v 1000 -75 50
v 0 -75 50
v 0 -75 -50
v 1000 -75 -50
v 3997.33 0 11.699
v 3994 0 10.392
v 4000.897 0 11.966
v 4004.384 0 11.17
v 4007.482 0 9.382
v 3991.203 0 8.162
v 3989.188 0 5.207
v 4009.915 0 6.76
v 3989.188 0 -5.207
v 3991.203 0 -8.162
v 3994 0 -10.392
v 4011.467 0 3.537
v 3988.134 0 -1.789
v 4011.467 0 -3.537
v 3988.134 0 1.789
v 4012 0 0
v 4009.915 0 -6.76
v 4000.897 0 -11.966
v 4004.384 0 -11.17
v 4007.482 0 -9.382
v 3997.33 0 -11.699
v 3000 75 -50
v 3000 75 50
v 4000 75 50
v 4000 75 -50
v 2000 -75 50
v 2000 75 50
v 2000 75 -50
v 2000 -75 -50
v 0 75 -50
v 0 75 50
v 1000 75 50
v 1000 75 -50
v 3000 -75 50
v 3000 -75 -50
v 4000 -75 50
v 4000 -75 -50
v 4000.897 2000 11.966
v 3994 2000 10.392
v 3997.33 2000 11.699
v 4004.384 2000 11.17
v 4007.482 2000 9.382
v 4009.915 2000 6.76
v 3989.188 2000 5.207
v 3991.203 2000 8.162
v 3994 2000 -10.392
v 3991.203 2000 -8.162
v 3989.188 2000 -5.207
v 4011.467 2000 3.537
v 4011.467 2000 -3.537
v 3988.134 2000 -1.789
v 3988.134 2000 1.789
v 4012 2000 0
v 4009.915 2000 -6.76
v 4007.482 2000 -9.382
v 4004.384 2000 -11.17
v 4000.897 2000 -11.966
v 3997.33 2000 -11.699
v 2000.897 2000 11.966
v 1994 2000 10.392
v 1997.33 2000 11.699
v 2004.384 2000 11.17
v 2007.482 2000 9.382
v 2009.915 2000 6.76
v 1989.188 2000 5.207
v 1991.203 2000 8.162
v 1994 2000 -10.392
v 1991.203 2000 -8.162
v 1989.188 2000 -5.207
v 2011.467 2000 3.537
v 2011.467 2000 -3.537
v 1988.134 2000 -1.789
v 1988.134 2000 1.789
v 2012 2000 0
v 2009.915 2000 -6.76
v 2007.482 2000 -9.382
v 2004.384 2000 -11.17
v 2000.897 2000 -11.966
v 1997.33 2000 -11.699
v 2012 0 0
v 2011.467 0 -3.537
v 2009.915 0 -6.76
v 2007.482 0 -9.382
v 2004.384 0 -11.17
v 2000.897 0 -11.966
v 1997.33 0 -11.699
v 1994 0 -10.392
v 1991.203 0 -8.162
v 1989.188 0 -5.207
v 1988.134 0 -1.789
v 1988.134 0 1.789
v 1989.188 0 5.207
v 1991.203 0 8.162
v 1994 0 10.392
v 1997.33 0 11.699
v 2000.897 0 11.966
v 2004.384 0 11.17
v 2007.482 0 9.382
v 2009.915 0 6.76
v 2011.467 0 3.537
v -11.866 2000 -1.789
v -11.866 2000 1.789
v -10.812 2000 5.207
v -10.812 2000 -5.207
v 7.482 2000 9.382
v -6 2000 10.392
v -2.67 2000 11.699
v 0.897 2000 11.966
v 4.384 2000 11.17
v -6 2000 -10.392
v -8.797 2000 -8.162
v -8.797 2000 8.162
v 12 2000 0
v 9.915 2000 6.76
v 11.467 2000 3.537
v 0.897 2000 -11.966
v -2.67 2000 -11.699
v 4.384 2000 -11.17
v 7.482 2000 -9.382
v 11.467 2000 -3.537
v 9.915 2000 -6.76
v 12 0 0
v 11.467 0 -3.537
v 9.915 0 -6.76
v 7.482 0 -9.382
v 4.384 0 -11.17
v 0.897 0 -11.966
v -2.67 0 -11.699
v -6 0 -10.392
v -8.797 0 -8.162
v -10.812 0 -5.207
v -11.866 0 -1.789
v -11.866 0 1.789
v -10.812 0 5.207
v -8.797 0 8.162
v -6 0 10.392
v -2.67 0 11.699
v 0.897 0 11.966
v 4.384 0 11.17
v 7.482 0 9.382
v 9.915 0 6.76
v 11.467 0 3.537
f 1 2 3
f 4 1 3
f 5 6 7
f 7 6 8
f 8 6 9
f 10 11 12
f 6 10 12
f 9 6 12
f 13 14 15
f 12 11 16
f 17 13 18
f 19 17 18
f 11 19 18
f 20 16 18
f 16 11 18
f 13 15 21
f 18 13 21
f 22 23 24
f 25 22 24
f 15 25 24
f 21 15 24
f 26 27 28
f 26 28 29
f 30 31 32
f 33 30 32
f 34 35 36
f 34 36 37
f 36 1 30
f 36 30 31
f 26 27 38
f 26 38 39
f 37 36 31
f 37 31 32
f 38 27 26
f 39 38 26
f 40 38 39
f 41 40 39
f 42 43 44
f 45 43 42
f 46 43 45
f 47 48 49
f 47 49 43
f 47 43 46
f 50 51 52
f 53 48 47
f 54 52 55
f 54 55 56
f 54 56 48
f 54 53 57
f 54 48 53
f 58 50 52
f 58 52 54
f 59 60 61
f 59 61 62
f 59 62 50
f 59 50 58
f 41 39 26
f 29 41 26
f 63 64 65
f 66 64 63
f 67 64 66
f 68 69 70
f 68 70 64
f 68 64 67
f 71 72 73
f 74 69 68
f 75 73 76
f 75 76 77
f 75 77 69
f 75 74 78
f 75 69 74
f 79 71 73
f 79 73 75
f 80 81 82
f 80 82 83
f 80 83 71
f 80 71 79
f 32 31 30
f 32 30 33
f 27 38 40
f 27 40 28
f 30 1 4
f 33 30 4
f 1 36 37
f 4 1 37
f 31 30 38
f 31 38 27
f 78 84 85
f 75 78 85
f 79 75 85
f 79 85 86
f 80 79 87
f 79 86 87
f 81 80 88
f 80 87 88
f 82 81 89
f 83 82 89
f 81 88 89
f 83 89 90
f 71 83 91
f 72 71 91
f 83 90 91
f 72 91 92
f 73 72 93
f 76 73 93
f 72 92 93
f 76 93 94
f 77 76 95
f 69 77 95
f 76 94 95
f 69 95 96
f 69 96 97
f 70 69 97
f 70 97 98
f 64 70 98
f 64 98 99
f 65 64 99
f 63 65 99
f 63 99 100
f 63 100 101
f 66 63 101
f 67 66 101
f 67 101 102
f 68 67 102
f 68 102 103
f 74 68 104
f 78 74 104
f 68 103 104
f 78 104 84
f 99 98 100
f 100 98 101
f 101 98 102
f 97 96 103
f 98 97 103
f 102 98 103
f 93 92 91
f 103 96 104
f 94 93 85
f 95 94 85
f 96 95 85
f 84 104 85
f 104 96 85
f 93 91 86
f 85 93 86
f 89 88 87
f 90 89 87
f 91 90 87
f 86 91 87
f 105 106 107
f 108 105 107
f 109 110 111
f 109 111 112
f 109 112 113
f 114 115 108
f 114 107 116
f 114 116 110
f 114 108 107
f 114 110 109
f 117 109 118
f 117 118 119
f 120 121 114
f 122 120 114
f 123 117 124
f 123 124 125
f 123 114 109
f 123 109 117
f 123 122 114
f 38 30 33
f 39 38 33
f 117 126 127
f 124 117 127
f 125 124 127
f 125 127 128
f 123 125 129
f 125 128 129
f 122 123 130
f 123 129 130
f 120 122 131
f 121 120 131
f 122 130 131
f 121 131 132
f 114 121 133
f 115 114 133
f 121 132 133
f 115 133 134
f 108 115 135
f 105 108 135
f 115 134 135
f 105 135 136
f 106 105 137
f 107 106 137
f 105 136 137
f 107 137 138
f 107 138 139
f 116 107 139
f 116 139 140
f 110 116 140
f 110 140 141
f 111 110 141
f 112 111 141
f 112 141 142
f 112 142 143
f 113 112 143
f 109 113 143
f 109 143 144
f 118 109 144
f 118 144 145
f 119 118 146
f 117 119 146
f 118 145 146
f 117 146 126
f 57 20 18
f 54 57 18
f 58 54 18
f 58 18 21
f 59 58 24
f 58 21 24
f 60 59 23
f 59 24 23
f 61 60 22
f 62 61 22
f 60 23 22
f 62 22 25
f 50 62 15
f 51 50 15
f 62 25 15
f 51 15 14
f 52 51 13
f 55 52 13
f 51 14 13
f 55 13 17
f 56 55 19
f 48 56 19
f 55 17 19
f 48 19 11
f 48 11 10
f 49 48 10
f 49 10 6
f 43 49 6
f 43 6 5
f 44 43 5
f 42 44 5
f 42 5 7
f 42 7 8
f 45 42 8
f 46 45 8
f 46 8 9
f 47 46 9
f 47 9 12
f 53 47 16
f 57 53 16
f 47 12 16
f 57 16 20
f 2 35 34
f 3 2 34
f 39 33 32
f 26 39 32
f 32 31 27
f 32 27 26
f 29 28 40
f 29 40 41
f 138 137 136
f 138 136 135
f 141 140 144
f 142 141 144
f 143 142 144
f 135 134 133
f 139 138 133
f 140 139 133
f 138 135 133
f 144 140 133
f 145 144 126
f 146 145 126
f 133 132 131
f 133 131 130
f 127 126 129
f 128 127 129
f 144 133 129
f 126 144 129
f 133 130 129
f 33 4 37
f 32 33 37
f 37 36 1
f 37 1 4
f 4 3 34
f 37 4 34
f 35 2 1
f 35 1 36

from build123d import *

# Parameters (mm, degrees)
SKETCH1_W        = 100
SKETCH1_H        = 150
SEGMENT_1_DEPTH  = 1000
SKETCH2_W        = 100
SKETCH2_H        = 150
SEGMENT_2_DEPTH  = 1000
SKETCH3_W        = 100
SKETCH3_H        = 150
SEGMENT_3_DEPTH  = 1000
SKETCH4_W        = 100
SKETCH4_H        = 150
SEGMENT_4_DEPTH  = 1000
SKETCH5_R        = 12
LINKAGES_DEPTH   = 2000
LINKAGES_2_DEPTH = 2000
LINKAGES_3_DEPTH = 2000


with BuildPart() as part:
    # Sketch1 → Segment 1 (new body)
    with BuildSketch(Plane(origin=(0, 0, 0), x_dir=(0, 0, -1), z_dir=(1, 0, 0))):
        Rectangle(SKETCH1_W, SKETCH1_H)
    extrude(amount=SEGMENT_1_DEPTH)


with BuildPart() as body_2:
    # Sketch2 → Segment 2 (new body)
    with BuildSketch(Plane(origin=(1000, 0, 0), x_dir=(0, 0, -1), z_dir=(1, 0, 0))):
        Rectangle(SKETCH2_W, SKETCH2_H)
    extrude(amount=SEGMENT_2_DEPTH)


with BuildPart() as body_3:
    # Sketch3 → Segment 3 (new body)
    with BuildSketch(Plane(origin=(2000, 0, 0), x_dir=(0, 0, -1), z_dir=(1, 0, 0))):
        Rectangle(SKETCH3_W, SKETCH3_H)
    extrude(amount=SEGMENT_3_DEPTH)


with BuildPart() as body_4:
    # Sketch4 → Segment 4 (new body)
    with BuildSketch(Plane(origin=(3000, 0, 0), x_dir=(0, 0, -1), z_dir=(1, 0, 0))):
        Rectangle(SKETCH4_W, SKETCH4_H)
    extrude(amount=SEGMENT_4_DEPTH)


with BuildPart() as body_5:
    # Sketch5 → Linkages (new body)
    with BuildSketch(Plane(origin=(0, 0, 0), x_dir=(1, 0, 0), z_dir=(0, 1, 0))):
        Circle(SKETCH5_R)
    extrude(amount=LINKAGES_DEPTH)


with BuildPart() as body_6:
    # Sketch5 → Linkages 2 (new body)
    with BuildSketch(Plane(origin=(0, 0, 0), x_dir=(1, 0, 0), z_dir=(0, 1, 0))):
        with Locations((2000, 0)):
            Circle(SKETCH5_R)
    extrude(amount=LINKAGES_2_DEPTH)


with BuildPart() as body_7:
    # Sketch5 → Linkages 3 (new body)
    with BuildSketch(Plane(origin=(0, 0, 0), x_dir=(1, 0, 0), z_dir=(0, 1, 0))):
        with Locations((4000, 0)):
            Circle(SKETCH5_R)
    extrude(amount=LINKAGES_3_DEPTH)


solid = Compound([part.part, body_2.part, body_3.part, body_4.part, body_5.part, body_6.part, body_7.part])
